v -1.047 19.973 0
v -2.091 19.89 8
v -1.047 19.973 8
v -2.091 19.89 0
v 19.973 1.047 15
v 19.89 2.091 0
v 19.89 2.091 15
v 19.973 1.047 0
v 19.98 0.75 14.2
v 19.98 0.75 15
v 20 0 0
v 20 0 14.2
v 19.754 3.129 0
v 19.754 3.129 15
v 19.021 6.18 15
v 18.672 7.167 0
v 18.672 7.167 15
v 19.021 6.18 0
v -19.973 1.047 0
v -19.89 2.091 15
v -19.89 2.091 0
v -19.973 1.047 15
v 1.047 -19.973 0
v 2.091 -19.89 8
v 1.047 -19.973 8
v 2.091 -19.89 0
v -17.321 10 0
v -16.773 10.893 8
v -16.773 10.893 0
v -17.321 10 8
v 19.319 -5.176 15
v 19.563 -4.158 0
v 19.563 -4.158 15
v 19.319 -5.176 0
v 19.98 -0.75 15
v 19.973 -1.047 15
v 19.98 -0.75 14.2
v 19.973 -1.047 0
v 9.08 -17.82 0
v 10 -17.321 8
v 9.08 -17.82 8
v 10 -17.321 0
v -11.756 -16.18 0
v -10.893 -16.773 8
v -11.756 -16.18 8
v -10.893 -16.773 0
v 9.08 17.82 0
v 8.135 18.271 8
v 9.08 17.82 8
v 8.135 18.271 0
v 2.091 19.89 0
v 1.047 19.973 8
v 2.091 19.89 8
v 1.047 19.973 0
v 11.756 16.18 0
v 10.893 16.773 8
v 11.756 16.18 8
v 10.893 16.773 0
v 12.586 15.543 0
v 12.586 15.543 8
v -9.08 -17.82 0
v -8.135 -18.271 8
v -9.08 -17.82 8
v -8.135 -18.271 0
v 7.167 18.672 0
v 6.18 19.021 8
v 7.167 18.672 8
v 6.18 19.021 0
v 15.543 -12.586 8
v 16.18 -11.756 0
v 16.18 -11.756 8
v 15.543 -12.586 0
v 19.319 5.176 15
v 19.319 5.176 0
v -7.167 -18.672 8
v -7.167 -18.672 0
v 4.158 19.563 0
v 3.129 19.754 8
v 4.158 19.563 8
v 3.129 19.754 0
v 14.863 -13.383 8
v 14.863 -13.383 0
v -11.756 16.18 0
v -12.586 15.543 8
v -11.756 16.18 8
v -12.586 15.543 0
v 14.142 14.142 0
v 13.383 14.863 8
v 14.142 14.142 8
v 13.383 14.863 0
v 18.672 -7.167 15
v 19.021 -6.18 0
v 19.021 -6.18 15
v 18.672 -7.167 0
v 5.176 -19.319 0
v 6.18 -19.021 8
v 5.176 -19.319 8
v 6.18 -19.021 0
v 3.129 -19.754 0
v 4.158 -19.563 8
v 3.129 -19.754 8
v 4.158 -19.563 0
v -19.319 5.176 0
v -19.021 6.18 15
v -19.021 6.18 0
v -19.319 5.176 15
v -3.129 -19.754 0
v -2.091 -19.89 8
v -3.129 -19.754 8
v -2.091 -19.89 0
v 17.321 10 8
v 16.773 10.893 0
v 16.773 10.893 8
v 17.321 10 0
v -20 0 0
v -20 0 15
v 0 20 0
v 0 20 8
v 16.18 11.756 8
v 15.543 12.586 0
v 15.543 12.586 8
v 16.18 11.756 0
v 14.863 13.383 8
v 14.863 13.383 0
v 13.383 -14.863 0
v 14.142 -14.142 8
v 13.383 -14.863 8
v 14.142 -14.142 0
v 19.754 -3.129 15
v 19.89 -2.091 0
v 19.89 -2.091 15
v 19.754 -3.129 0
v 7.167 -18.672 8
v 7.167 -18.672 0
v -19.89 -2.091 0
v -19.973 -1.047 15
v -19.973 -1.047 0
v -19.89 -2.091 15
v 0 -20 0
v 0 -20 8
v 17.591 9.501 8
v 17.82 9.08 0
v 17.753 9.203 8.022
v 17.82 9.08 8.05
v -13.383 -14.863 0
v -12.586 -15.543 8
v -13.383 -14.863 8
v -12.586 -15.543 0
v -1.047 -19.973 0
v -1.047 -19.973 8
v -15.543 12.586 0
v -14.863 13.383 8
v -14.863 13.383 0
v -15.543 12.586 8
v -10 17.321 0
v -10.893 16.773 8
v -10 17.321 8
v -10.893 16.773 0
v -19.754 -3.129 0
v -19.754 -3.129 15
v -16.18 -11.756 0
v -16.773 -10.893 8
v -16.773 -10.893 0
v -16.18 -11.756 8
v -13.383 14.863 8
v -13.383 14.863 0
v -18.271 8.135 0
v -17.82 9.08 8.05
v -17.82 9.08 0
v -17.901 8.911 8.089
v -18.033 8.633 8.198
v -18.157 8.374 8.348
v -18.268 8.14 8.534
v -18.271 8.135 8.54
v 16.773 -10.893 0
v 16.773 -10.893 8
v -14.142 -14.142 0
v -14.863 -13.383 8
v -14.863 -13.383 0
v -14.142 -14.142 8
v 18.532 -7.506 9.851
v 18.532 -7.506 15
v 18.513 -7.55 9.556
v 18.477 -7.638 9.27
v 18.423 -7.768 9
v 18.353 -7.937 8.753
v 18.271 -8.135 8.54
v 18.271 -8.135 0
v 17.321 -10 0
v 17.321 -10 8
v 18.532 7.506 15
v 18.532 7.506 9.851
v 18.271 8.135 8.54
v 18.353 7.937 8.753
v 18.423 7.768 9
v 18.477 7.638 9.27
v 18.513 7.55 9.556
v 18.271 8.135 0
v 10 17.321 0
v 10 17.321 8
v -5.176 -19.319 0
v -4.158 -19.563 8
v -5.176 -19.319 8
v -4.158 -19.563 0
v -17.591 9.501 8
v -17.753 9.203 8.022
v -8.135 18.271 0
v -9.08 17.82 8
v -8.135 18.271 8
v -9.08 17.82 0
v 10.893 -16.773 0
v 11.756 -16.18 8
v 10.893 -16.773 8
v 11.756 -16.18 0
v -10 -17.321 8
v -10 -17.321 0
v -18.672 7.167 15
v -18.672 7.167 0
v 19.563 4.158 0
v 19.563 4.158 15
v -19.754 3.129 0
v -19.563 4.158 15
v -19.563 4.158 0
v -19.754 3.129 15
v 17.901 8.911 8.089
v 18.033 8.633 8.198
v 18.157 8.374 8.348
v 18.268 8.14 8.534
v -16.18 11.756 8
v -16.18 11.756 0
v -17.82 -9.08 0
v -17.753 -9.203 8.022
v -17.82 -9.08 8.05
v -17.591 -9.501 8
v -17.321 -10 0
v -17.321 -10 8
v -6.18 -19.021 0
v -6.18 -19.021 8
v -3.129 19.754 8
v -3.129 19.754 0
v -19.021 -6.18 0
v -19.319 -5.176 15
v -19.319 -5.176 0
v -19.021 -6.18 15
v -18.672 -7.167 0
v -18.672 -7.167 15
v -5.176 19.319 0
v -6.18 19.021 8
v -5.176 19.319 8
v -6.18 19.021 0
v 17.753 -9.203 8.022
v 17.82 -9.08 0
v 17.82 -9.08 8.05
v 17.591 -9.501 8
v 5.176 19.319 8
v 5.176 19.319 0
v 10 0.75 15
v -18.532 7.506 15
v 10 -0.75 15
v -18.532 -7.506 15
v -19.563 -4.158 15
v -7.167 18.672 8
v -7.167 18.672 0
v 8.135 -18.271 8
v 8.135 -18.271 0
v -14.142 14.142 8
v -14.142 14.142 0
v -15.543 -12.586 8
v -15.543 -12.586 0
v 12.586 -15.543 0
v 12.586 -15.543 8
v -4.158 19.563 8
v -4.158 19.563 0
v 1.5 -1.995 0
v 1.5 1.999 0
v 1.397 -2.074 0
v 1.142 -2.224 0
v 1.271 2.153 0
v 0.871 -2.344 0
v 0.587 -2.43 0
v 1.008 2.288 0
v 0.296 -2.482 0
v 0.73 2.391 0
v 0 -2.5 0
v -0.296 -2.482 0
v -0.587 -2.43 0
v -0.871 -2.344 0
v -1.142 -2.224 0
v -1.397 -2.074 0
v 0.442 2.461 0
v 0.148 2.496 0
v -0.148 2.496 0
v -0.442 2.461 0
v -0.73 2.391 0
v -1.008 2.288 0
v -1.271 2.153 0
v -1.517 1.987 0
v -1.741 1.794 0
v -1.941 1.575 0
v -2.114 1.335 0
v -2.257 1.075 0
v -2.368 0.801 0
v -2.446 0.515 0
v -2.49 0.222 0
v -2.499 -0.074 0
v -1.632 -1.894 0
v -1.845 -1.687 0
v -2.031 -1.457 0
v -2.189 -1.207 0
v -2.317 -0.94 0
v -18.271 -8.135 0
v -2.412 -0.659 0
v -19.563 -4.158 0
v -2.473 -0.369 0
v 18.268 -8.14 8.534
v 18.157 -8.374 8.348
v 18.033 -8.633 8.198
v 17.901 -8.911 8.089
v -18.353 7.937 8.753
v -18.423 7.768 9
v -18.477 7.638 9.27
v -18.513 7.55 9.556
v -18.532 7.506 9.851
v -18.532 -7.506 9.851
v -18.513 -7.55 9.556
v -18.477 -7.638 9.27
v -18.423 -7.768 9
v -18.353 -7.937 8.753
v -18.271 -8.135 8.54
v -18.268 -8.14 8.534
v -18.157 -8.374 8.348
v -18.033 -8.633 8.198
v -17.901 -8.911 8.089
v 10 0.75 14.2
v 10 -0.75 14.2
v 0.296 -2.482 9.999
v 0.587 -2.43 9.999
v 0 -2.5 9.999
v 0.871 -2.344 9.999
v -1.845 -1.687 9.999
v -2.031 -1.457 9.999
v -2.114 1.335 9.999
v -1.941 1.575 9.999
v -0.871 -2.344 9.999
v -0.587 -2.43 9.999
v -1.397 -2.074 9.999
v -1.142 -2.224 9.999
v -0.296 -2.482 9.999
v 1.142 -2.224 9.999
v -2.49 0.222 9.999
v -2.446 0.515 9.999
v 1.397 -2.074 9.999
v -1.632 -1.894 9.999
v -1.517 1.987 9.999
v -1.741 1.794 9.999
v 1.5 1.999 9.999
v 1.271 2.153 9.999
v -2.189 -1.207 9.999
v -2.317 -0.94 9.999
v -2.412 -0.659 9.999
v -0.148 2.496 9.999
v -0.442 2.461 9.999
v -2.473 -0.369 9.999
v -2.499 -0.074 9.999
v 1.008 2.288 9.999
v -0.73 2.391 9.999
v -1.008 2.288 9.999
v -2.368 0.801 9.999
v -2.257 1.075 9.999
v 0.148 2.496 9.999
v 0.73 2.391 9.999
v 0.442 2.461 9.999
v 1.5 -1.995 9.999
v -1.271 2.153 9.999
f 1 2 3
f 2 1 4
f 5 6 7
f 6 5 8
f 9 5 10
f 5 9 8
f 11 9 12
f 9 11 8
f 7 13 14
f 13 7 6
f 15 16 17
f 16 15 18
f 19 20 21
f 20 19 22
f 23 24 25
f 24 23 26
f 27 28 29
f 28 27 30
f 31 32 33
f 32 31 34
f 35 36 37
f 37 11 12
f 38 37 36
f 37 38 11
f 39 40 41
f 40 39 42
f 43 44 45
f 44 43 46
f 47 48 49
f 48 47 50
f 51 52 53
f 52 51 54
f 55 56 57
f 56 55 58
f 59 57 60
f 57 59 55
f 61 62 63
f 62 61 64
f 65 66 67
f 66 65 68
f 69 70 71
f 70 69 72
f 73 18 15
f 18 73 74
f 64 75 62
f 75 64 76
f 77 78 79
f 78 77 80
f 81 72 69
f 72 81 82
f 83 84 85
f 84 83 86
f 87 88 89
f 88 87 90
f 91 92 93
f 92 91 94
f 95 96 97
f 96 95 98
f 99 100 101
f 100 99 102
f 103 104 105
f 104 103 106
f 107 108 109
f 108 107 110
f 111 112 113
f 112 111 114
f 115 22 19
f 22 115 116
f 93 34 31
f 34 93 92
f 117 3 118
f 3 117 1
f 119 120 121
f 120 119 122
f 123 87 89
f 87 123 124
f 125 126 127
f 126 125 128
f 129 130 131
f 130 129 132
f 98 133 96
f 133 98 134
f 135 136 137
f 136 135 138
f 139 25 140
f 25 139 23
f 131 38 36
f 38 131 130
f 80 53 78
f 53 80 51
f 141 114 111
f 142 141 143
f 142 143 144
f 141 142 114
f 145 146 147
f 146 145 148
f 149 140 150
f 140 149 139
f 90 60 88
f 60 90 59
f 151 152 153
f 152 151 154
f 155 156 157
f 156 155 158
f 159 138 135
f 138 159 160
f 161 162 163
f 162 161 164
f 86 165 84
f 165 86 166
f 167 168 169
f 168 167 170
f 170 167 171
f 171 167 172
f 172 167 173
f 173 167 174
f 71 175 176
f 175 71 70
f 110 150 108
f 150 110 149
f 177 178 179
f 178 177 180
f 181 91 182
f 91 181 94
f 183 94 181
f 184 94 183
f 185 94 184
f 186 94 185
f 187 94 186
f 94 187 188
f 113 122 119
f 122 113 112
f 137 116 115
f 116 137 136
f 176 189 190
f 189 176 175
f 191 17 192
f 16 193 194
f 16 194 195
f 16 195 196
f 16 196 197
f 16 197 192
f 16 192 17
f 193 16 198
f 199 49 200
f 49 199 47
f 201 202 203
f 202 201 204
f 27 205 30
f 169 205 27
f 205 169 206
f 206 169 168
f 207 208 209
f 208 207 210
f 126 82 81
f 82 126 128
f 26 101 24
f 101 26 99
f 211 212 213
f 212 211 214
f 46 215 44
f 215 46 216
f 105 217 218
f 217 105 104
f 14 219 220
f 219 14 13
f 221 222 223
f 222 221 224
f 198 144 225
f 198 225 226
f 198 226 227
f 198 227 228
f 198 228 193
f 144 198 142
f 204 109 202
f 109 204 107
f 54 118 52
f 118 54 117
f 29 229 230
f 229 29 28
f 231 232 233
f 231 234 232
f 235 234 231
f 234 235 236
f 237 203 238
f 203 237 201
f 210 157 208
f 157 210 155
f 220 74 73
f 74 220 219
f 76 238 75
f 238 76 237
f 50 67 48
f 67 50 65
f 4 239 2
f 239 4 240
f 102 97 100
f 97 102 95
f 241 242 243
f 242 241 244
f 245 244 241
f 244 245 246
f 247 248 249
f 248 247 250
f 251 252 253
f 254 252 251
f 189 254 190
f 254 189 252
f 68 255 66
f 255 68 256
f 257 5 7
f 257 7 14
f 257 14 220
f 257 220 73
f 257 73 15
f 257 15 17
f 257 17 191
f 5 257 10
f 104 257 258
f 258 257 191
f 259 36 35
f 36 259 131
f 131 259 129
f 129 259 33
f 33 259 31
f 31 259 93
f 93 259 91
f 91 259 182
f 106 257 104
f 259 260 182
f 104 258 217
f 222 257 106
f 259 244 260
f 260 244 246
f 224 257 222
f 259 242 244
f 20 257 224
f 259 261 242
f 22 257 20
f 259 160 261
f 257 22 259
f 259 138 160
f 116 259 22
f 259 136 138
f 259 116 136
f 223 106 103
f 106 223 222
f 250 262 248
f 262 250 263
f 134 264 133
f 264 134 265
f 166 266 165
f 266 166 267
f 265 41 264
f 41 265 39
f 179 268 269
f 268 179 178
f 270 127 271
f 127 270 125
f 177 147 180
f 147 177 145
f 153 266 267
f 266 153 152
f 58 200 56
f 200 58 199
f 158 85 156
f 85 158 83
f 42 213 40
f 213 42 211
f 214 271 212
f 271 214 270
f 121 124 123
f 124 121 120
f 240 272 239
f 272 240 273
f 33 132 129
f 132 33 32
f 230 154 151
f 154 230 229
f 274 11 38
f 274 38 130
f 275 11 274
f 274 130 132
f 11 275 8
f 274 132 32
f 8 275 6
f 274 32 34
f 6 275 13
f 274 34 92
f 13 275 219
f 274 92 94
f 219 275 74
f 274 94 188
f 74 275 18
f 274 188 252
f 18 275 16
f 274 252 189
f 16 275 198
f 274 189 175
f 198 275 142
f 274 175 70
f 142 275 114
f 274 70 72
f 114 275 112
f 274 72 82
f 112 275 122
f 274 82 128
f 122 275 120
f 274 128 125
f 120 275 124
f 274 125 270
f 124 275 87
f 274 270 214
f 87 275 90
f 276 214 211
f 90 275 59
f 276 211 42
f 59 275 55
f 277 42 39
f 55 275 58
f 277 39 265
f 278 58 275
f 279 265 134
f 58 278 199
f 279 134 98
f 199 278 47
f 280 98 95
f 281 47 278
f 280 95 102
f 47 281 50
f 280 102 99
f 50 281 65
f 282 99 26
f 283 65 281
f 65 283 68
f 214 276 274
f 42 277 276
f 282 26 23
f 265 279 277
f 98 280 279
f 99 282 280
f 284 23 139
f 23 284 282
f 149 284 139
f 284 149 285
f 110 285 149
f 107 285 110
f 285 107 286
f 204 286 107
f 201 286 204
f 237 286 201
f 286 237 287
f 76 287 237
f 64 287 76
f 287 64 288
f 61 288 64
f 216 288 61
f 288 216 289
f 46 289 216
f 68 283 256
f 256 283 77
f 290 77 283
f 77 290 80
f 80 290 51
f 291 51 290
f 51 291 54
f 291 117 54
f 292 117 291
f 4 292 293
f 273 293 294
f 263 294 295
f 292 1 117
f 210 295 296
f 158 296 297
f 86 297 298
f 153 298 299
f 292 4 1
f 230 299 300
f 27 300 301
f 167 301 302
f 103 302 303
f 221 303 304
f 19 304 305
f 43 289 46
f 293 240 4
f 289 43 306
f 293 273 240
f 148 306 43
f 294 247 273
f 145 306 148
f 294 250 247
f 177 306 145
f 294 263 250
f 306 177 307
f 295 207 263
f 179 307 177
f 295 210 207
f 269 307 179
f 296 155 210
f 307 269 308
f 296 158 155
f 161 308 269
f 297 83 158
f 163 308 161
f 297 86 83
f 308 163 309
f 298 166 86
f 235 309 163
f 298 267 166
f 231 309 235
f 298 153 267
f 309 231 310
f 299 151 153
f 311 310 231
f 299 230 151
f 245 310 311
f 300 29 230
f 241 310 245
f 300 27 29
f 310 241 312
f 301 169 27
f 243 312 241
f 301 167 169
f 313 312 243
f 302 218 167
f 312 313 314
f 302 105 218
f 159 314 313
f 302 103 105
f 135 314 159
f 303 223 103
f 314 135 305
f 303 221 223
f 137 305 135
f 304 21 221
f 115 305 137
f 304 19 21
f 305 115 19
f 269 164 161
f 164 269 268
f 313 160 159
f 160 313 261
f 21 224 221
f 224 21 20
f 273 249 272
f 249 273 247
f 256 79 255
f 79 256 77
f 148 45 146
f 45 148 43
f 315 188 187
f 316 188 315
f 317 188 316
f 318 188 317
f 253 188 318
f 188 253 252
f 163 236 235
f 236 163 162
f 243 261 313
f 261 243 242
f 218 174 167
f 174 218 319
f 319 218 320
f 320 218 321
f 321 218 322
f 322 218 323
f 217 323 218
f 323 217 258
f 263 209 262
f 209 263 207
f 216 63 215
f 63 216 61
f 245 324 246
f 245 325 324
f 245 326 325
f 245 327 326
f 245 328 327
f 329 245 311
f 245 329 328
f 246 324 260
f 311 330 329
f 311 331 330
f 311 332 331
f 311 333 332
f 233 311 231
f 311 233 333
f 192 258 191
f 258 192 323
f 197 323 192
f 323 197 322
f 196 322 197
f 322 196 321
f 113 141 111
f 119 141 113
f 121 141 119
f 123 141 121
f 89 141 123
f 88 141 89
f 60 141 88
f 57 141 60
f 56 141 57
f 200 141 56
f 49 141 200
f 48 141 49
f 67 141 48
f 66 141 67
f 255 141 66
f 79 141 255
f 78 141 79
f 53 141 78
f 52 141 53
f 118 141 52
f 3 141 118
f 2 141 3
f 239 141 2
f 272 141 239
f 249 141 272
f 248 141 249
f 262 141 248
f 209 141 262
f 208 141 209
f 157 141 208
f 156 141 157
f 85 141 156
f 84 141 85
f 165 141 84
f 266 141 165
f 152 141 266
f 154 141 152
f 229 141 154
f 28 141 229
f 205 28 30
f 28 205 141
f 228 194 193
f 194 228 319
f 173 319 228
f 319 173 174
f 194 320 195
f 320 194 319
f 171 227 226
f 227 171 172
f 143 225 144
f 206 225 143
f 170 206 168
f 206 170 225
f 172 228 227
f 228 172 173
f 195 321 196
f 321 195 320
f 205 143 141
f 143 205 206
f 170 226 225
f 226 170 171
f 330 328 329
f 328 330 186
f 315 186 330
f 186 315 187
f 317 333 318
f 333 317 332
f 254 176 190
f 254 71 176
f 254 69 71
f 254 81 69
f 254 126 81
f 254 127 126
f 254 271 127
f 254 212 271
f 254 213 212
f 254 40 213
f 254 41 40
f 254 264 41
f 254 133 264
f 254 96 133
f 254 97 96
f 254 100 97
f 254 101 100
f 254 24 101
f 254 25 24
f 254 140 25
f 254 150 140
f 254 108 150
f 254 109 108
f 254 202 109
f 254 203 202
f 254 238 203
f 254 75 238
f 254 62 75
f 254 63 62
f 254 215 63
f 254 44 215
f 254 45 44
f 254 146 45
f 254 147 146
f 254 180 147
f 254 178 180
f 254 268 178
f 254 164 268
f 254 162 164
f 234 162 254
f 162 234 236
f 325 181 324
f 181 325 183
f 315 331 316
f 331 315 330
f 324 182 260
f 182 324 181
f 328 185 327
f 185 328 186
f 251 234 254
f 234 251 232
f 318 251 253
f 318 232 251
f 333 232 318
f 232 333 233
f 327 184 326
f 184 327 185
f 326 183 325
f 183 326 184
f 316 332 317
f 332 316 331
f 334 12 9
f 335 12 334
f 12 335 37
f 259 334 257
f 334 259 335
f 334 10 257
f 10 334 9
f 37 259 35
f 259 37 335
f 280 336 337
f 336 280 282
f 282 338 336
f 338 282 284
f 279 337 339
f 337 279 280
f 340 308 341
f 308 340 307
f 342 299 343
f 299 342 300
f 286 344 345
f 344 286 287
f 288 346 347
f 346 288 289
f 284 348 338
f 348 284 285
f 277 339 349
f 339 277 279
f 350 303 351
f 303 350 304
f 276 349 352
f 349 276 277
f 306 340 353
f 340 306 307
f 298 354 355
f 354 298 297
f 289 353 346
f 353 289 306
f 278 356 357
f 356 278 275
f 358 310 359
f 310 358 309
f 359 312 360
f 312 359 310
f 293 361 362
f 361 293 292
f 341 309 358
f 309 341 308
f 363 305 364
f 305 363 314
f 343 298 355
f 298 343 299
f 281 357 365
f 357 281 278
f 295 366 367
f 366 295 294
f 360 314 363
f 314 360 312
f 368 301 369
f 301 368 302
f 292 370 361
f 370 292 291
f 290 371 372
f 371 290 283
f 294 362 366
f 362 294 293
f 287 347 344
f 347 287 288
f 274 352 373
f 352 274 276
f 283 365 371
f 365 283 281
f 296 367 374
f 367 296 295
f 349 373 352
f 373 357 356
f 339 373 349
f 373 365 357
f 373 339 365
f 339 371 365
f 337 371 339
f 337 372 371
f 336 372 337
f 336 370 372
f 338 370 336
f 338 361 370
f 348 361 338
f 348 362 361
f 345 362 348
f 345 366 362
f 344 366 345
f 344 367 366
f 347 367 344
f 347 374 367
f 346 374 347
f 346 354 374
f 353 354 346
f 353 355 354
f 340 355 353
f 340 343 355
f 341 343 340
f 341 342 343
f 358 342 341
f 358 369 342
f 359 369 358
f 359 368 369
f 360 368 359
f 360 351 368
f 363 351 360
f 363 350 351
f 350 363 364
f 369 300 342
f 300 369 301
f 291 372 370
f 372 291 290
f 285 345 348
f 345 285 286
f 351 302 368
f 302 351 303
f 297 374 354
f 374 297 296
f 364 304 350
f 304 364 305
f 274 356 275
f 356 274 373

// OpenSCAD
/* [Knob] */
Diameter=40;
Full_height=15;
Head_height=7;
Head_width=15;
Head_fillet=2;
/* [Marker line] */
Line_width=1.5;
Line_height=10;
Line_depth=0.8;
/* [Shaft] */
// Shaft Diameter ⌀
Shaft_Diameter = 5.0;
// Diameter (across cut) >D<
D_Shaft_Diameter = 4.0;
Shaft_depth=10;
Shaft_rotation=0; //[0:90:270]
/* [Bottom] */

Bottom_type="Full"; // [Full, Inner, Outer]
Inner_diameter=15;
Wall_width=3;
Wall=Diameter-Wall_width;
Outher_Length = 10;
Outer_diameter = 13;
/* [Hidden] */
$fs=.3;
/* [Hidden] */
$fa=3;
Fillet_radius=Head_fillet+0.001;

module Knob(){
    difference(){
    cylinder(h=Full_height, d=Diameter);

        translate([-Diameter/2,Fillet_radius+Head_width/2,Diameter+Fillet_radius+Full_height-Head_height])
       rotate([0,90,0])minkowski()
            {
              cube([Diameter,Diameter,1]);
              cylinder(r=Fillet_radius,h=Diameter);
            }

        translate([-Diameter/2,-Fillet_radius-Head_width/2-Diameter,Diameter+Fillet_radius+Full_height-Head_height])
       rotate([0,90,0])minkowski()
            {
              cube([Diameter,Diameter,1]);
              cylinder(r=Fillet_radius,h=Diameter);
            }
            translate([Diameter/2,0,Full_height])
    cube([Line_height*2,Line_width,Line_depth*2], center=true);
    if (Bottom_type=="Inner") Hollow();
    }
}
module Hollow(){
    translate([0, 0, -0.001])difference() {
    if (Wall_width<=1) 
        cylinder(h = Full_height-Head_height-1, d = Diameter-1);
    else
        cylinder(h = Full_height-Head_height-Wall_width, d = Wall);
        
    translate([0, 0, 0])
        if (Inner_diameter<=Shaft_Diameter) 
            cylinder(h = Full_height, d = Shaft_Diameter+1);
        else
            cylinder(h = Full_height, d = Inner_diameter);
    }
}

module Shaft(){
        translate([0, 0, -0.001])rotate([0,0,270])difference(){
        cylinder(h=Shaft_depth, d=Shaft_Diameter);
        translate([0,D_Shaft_Diameter,(Shaft_depth/2)])
        cube([Shaft_Diameter,Shaft_Diameter,Shaft_depth], center=true);
    }
}
if (Bottom_type=="Outer"){
  difference(){
  union(){
    Knob();
    translate([0,0,0-Outher_Length])cylinder(h = Outher_Length, d = Outer_diameter);
    }
  rotate([0,0,Shaft_rotation])translate([0,0,0-Outher_Length])Shaft();
  }
}

if (Bottom_type!="Outer"){
    difference(){
        Knob();
        rotate([0,0,Shaft_rotation])
        Shaft();
    }
}
